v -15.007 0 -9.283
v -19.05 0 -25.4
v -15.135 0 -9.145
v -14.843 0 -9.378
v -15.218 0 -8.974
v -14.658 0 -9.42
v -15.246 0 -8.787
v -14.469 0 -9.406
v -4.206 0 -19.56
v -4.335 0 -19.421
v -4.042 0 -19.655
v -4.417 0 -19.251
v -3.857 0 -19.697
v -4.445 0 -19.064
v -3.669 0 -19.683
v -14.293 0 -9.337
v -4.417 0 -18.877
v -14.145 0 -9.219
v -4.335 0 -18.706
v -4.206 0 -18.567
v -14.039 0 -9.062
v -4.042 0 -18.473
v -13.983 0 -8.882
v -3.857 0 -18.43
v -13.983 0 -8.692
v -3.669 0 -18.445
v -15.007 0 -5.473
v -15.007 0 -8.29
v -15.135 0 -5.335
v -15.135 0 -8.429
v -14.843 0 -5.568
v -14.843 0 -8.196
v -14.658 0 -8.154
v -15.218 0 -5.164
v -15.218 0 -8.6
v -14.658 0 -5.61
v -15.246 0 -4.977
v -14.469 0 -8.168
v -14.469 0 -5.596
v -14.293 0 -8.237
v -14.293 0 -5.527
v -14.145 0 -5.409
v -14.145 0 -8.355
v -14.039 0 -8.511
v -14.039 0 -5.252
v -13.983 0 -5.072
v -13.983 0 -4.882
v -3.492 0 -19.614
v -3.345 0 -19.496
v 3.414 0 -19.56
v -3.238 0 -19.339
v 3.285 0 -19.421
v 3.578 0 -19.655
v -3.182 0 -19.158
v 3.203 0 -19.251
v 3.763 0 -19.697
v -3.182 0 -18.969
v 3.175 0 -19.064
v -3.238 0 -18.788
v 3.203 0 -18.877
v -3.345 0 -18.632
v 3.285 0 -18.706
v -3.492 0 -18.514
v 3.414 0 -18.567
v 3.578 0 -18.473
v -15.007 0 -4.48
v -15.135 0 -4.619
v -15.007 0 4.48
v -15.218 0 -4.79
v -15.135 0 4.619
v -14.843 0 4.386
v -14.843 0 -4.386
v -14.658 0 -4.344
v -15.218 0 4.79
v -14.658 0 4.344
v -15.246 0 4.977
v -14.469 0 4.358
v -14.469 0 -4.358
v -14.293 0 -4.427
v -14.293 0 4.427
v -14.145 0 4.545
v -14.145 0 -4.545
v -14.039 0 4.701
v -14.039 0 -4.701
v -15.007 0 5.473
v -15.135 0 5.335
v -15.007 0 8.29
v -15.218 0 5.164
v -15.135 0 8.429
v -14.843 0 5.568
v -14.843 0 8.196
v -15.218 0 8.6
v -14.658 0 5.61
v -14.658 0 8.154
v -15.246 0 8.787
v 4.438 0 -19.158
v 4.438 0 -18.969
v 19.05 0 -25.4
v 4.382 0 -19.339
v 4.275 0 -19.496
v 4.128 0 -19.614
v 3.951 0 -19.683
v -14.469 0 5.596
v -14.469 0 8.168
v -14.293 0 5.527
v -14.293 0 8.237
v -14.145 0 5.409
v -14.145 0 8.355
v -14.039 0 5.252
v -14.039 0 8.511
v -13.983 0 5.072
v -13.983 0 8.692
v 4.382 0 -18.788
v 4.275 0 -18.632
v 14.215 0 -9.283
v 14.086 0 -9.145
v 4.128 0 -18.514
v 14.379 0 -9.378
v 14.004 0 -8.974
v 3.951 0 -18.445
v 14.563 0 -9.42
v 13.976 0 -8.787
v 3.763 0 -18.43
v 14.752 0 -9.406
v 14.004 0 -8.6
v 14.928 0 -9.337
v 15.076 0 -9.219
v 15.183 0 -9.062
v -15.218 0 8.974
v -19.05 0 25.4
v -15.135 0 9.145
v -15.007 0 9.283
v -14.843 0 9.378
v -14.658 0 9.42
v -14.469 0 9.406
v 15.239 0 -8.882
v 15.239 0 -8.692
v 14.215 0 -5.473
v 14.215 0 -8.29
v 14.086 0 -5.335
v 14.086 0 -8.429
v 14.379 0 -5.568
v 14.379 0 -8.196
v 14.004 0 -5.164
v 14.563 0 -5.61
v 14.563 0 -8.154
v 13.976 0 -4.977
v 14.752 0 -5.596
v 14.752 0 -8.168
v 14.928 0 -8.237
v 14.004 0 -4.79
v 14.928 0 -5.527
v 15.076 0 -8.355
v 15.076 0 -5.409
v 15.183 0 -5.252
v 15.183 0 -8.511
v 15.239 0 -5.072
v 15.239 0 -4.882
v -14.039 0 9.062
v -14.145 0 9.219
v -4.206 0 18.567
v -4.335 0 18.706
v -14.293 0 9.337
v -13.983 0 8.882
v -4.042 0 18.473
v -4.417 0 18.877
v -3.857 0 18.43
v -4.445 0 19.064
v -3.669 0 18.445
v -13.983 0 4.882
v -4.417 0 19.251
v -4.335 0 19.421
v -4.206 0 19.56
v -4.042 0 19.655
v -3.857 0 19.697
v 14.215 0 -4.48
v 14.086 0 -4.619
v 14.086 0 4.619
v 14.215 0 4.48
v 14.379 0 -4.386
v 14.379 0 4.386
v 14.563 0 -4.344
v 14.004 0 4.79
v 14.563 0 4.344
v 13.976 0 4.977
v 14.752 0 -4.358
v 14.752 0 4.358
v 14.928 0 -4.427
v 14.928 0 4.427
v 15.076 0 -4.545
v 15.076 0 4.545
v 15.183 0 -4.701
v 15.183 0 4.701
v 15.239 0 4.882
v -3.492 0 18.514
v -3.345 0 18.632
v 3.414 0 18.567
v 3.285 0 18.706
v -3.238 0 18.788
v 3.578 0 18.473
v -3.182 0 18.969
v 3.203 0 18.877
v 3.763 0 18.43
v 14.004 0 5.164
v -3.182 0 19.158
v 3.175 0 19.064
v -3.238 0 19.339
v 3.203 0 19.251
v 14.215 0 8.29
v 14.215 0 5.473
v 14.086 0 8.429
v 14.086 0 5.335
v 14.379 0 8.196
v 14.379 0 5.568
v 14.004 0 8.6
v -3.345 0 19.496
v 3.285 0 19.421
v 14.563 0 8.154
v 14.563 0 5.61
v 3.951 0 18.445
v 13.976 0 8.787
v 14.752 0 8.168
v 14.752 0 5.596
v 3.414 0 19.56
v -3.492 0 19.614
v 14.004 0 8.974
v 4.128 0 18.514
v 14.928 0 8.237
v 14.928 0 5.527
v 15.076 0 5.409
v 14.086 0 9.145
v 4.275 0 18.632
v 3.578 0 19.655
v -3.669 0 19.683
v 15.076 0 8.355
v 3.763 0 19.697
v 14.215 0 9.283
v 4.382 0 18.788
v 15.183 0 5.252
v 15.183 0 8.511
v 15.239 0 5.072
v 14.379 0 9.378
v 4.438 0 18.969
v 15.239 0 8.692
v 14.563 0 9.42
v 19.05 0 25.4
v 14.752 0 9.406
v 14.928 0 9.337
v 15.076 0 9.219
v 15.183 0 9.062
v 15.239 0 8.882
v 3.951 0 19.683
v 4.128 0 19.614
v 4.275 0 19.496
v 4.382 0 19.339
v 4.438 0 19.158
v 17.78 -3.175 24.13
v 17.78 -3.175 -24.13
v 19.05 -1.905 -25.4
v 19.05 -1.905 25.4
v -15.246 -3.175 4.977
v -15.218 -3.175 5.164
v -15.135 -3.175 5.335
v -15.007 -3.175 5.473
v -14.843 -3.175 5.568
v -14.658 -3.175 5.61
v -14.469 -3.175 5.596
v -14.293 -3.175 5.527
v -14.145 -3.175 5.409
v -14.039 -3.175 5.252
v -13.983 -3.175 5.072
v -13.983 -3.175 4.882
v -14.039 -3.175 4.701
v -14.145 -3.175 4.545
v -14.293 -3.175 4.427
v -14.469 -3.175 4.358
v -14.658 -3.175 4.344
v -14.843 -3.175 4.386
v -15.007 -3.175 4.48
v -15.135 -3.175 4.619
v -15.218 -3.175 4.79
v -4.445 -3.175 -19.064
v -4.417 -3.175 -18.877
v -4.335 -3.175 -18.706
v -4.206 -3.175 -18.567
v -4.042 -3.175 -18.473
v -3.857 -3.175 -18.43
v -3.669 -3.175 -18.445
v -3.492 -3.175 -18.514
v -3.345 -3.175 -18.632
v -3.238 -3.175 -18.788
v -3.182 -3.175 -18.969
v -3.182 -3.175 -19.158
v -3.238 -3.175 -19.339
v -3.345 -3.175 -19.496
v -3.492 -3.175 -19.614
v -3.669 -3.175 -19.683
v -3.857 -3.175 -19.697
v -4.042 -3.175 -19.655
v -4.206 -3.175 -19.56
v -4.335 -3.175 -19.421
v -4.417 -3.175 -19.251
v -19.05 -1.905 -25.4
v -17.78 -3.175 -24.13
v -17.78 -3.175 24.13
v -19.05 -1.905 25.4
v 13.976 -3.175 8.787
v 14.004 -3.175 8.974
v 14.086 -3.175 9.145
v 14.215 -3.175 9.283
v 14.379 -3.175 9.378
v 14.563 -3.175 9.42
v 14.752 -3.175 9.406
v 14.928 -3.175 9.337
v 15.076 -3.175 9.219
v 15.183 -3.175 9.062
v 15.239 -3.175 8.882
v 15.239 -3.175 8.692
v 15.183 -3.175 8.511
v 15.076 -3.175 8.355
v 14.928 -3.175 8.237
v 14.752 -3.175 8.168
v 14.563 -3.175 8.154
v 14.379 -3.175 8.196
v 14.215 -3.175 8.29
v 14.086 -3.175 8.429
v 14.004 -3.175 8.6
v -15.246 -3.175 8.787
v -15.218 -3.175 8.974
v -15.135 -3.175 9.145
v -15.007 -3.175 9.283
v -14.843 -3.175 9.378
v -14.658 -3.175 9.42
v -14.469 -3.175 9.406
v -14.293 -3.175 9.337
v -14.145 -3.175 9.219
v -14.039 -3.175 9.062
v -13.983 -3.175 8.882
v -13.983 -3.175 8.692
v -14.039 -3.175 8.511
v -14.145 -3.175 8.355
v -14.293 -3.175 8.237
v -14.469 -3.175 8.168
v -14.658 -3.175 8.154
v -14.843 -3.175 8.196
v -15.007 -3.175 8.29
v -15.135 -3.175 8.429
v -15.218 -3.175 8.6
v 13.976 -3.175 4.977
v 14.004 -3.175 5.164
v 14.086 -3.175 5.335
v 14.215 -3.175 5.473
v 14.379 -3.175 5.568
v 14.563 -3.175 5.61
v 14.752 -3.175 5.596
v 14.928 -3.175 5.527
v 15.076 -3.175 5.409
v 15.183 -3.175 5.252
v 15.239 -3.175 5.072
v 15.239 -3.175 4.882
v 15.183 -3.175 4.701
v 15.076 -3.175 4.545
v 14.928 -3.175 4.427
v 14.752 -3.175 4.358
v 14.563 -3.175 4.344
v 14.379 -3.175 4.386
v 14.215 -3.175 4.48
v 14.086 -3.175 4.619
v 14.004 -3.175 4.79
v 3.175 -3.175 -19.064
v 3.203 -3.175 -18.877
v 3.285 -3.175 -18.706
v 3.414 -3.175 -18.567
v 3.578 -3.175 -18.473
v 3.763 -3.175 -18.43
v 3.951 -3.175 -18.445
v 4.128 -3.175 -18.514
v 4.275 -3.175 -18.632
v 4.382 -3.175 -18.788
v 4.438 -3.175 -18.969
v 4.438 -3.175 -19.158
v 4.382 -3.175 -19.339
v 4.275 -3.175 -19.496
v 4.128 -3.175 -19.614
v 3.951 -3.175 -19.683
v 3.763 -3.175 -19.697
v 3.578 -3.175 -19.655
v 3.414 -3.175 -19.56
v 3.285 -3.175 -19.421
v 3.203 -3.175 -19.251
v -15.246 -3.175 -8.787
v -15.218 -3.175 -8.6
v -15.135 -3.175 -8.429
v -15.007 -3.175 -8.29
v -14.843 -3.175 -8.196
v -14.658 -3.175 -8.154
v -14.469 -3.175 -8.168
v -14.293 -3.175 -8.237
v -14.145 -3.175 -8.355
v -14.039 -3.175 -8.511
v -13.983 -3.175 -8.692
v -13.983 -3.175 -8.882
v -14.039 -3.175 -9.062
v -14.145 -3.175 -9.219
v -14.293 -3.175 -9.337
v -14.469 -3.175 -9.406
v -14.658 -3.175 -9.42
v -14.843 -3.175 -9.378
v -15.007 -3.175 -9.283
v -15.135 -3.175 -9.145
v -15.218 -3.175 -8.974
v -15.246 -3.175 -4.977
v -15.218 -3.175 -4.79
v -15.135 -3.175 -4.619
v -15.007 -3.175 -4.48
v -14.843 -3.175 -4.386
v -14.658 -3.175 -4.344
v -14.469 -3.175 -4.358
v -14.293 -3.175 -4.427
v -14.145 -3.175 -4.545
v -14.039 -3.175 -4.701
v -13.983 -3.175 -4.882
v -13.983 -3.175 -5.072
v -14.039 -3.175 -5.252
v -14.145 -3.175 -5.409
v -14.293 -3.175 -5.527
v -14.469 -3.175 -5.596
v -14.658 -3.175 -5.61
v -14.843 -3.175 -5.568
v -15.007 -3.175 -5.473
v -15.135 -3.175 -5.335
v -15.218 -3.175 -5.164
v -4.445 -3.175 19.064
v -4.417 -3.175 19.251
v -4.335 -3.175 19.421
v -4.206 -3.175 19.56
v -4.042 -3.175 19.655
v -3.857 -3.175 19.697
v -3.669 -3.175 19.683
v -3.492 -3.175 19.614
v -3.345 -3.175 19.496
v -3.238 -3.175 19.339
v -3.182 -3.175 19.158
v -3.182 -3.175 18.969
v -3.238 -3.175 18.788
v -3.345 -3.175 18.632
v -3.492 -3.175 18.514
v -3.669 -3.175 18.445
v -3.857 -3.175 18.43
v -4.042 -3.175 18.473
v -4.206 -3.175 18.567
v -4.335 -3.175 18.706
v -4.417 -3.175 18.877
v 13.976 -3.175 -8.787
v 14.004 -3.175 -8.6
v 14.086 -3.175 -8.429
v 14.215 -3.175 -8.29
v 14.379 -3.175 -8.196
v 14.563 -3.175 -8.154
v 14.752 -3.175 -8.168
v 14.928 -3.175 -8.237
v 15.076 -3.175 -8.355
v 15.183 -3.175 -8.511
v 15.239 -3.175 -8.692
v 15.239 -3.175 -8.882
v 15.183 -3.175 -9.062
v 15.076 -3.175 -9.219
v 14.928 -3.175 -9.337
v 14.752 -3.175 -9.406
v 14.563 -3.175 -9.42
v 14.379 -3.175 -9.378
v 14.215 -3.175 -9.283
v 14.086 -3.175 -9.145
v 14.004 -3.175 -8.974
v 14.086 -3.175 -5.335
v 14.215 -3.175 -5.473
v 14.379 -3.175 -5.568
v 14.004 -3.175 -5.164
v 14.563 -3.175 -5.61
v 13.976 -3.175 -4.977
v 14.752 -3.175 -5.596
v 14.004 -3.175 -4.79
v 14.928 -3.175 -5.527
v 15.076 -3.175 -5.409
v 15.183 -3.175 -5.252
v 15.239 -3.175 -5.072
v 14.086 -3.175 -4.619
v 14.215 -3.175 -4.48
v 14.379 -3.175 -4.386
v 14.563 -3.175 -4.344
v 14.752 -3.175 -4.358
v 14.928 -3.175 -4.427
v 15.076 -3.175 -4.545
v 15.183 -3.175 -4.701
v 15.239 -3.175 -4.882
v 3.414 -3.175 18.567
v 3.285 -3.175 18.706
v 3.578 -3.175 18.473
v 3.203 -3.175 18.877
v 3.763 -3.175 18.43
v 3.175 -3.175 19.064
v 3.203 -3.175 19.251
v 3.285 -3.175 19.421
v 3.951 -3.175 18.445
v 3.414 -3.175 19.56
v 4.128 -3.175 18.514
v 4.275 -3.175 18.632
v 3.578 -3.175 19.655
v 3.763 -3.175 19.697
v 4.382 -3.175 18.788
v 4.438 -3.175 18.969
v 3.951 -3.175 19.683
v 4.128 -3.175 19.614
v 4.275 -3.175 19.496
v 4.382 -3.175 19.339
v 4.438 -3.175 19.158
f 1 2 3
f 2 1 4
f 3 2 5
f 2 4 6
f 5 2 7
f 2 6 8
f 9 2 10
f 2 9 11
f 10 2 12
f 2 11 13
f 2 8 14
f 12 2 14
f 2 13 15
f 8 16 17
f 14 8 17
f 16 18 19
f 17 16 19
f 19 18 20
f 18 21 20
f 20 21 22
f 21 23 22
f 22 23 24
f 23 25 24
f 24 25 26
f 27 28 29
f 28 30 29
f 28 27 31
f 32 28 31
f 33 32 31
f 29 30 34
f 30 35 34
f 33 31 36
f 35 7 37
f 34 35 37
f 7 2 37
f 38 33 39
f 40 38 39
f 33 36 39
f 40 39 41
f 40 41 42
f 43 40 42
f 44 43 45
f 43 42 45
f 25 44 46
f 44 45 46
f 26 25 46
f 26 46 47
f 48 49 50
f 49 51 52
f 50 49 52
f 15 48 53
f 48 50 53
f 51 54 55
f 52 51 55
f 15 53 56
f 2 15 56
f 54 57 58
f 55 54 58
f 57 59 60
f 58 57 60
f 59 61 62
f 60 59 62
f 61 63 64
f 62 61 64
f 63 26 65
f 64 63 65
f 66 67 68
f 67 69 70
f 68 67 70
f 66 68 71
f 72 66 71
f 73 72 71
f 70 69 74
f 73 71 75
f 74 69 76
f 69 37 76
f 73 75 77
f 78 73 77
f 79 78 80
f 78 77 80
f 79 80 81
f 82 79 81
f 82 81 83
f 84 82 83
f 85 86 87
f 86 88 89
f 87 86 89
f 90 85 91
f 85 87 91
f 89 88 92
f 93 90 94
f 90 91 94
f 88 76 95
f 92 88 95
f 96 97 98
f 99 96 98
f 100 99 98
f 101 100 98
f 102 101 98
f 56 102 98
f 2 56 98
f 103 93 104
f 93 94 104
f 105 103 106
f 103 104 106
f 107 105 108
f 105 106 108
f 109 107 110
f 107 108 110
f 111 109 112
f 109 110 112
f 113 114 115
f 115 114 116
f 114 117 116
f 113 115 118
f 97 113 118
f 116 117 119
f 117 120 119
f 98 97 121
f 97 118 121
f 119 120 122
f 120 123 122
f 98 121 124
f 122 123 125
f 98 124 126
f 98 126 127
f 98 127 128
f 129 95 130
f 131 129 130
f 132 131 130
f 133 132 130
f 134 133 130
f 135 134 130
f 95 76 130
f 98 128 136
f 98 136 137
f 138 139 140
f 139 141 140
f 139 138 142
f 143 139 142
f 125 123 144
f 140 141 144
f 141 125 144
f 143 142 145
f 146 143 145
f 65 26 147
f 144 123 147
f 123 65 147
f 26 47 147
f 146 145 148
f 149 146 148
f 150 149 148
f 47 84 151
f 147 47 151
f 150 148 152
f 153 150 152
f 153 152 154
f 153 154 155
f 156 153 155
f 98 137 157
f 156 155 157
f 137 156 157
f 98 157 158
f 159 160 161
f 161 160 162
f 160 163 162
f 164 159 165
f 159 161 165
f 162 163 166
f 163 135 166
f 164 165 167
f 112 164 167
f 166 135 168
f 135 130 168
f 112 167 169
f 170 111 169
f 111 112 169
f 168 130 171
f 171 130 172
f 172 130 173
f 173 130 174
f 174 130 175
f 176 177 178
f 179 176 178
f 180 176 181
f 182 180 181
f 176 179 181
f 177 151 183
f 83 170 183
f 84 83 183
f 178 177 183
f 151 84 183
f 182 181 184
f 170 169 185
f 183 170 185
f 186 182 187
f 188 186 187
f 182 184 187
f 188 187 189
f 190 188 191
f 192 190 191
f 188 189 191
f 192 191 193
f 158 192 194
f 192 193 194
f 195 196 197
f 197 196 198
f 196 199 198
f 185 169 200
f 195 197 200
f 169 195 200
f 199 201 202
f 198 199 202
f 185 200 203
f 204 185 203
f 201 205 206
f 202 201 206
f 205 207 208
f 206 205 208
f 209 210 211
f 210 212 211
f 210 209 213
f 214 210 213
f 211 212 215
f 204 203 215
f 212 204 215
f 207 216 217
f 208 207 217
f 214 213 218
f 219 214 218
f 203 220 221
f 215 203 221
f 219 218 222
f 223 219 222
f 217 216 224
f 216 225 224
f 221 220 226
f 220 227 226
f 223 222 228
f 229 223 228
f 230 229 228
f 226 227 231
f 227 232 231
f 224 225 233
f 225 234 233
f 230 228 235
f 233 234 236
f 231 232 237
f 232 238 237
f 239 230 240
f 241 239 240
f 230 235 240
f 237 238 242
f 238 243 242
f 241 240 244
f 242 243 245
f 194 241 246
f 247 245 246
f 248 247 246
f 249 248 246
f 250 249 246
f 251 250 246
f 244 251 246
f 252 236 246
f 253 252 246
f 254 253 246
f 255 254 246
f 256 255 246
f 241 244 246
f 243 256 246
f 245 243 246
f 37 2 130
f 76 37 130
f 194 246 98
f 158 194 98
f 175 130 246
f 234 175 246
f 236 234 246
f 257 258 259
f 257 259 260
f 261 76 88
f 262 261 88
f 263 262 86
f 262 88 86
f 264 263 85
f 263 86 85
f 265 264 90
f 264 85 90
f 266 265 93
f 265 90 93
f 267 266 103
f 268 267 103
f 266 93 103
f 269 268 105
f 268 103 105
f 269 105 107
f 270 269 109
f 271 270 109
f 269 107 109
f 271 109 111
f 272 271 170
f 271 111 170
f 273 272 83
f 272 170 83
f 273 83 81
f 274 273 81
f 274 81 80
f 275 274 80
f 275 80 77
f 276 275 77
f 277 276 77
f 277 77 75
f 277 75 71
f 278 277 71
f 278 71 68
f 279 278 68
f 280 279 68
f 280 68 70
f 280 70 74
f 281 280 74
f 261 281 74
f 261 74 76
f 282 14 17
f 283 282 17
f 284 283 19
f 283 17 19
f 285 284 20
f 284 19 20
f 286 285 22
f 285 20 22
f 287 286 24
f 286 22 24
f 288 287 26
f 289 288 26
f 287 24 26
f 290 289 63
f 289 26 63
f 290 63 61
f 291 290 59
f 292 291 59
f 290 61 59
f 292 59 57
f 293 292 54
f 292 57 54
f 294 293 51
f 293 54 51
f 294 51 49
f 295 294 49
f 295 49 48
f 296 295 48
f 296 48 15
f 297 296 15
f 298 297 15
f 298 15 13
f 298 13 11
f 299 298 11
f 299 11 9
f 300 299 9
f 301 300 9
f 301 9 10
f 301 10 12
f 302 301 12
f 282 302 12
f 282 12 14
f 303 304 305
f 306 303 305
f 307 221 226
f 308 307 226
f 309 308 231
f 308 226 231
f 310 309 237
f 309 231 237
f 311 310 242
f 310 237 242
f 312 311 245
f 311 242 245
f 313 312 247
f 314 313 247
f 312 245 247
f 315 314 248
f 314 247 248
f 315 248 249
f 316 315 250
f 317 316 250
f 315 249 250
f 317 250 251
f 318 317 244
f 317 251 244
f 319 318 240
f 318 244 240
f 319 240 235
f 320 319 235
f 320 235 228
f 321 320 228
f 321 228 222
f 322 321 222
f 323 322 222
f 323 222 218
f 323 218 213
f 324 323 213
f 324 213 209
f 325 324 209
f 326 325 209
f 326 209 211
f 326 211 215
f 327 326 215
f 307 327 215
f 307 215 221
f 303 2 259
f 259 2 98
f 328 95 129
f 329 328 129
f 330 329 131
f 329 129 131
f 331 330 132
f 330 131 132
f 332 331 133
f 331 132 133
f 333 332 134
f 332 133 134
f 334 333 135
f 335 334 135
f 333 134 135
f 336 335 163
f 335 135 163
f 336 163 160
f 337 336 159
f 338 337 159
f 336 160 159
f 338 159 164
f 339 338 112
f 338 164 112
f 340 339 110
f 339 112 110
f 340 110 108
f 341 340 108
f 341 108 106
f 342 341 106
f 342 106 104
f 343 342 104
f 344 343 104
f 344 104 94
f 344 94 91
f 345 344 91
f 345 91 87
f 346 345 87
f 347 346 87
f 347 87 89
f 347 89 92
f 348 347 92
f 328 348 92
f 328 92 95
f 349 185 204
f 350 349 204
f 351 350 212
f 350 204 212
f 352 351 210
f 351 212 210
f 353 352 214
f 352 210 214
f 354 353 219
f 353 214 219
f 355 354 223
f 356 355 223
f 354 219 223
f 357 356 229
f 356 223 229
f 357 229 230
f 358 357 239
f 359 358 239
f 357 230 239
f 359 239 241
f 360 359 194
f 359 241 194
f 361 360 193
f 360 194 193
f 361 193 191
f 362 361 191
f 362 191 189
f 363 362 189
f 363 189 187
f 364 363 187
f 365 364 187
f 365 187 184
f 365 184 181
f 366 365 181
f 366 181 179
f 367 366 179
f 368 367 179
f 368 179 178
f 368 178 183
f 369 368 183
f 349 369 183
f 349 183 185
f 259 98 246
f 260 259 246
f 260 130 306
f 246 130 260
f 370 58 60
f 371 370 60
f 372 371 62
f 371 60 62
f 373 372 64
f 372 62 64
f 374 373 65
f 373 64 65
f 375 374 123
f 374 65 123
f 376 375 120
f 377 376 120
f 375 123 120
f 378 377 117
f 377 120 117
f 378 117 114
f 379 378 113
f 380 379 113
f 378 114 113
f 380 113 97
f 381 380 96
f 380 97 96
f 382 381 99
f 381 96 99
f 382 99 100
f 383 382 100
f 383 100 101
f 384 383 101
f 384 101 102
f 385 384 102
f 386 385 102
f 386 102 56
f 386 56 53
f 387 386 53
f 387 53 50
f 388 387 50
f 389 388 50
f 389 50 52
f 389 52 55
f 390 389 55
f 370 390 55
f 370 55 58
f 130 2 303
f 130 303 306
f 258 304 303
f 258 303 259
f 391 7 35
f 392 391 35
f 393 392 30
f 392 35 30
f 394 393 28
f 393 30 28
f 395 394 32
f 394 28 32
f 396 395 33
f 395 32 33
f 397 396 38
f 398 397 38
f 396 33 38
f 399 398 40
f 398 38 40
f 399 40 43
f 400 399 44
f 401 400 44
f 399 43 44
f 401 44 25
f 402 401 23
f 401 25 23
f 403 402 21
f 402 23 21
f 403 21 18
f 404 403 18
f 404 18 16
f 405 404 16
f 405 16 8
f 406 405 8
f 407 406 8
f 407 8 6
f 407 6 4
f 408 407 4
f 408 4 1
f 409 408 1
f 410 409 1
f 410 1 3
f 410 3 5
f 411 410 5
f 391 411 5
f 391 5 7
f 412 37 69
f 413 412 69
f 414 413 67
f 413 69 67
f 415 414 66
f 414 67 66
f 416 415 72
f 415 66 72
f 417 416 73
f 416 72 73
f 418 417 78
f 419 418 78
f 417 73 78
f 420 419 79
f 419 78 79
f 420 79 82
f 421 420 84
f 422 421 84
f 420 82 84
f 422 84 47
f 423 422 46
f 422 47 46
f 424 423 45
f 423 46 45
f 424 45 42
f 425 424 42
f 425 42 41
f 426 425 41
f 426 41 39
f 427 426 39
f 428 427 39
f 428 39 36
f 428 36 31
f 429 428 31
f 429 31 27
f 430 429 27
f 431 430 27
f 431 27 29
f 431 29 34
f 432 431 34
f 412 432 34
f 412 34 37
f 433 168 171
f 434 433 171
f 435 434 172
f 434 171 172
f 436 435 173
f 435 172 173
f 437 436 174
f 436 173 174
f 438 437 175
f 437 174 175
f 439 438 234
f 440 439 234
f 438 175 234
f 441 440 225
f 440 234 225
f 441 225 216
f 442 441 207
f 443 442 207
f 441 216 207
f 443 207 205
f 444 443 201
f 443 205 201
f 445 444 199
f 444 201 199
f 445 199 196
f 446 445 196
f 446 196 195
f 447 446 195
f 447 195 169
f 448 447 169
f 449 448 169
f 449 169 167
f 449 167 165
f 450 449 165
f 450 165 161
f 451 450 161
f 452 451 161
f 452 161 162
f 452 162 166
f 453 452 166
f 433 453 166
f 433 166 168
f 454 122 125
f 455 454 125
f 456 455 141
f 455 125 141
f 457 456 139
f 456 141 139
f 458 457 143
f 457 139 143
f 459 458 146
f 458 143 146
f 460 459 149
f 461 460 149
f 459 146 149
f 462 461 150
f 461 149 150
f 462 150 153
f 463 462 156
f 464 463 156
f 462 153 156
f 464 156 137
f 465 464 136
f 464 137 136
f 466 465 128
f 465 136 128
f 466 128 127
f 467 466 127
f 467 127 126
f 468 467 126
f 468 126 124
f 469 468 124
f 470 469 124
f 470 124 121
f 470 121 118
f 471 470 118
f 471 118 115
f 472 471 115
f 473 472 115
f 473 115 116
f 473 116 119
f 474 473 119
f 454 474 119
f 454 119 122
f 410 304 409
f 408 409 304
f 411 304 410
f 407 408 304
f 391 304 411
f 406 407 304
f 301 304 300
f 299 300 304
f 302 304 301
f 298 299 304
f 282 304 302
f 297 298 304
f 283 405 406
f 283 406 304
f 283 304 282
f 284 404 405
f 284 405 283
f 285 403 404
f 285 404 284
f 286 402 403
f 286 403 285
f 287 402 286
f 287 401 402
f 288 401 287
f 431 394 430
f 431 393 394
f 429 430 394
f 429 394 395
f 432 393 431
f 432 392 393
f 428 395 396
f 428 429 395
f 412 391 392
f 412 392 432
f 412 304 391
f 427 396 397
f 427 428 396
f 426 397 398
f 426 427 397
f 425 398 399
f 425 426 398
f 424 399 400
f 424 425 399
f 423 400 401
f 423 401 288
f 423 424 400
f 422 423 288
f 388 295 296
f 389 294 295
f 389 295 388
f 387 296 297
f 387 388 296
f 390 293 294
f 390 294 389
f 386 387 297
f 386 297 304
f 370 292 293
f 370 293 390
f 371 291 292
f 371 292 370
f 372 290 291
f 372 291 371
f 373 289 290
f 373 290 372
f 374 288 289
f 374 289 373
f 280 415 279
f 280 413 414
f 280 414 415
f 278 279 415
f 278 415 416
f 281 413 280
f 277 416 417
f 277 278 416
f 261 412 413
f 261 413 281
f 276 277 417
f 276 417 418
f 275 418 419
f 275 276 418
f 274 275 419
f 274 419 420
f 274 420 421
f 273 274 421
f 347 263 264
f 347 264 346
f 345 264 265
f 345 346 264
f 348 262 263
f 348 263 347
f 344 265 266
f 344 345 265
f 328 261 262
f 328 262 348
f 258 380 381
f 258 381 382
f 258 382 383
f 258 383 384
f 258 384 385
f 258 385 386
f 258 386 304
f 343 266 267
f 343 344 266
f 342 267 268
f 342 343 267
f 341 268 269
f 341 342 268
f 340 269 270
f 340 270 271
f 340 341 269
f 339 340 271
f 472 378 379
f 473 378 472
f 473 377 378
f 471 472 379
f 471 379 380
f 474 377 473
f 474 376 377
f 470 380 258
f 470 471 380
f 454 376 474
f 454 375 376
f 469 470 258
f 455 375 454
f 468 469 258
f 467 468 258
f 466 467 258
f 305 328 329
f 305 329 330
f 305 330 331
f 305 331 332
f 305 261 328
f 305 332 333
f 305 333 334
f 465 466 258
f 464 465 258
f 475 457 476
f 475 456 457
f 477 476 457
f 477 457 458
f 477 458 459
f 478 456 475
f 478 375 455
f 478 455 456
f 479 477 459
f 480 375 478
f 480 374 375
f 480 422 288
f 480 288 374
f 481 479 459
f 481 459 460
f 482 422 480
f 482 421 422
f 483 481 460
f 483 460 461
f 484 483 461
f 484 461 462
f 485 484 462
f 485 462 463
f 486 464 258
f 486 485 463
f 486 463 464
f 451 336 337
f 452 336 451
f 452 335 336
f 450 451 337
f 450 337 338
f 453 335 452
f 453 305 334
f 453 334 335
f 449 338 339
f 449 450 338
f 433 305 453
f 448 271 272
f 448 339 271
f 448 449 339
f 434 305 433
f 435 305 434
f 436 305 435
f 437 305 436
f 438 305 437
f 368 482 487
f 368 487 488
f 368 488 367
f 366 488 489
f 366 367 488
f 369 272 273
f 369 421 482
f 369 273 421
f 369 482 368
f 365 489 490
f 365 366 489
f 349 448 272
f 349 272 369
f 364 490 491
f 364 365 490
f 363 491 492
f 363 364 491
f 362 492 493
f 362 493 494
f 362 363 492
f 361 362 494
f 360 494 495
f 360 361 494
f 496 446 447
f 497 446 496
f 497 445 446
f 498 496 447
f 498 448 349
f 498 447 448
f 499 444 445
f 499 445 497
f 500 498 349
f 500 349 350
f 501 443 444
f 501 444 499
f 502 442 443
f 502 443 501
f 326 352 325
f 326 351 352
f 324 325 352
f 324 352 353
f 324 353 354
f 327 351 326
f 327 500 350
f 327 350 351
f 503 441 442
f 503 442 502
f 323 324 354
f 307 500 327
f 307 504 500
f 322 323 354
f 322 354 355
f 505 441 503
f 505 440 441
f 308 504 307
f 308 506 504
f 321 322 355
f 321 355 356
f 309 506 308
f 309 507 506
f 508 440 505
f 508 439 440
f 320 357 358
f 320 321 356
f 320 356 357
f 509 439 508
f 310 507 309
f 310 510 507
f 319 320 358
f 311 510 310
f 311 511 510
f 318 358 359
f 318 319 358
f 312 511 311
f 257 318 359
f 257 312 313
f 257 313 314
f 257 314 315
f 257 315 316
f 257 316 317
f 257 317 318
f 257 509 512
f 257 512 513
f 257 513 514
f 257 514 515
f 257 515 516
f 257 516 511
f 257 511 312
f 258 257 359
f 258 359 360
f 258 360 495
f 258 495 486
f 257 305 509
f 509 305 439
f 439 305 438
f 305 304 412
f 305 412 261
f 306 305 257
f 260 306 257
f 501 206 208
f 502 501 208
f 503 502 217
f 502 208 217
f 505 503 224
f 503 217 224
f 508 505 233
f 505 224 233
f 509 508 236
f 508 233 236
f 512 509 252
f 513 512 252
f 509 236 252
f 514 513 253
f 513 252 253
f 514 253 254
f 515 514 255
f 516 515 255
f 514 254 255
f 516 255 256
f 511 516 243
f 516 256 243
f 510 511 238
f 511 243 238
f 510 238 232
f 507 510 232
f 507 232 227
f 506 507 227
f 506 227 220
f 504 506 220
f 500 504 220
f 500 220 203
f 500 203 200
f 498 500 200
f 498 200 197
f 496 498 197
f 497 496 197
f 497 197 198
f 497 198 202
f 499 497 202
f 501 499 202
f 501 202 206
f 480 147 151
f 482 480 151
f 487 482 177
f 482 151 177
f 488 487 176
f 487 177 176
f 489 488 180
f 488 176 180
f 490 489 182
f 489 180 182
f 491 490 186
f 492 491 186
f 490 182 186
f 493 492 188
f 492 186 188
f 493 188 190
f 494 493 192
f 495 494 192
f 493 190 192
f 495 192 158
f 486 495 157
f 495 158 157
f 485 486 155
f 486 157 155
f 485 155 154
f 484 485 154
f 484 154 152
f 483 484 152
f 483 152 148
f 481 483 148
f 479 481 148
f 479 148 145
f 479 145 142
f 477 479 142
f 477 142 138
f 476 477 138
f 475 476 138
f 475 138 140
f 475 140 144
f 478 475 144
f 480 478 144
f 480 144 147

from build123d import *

# Parameters (mm, degrees)
F0_W     = 38.1
F0_H     = 50.8
F1_DEPTH = 3.175
F2_SIZE  = 1.27
F4_D     = 1.27


with BuildPart() as f1:
    # F0 (on Front) → F1 (new body)
    with BuildSketch(Plane.XZ):
        Rectangle(F0_W, F0_H)
    extrude(amount=F1_DEPTH)

    # F2
    f2_edges = [f1.edges().sort_by_distance(p)[0] for p in [
        (19.05, -3.175, 0),
        (0, -3.175, 25.4),
        (-19.05, -3.175, 0),
        (0, -3.175, -25.4),
    ]]
    chamfer(f2_edges, length=F2_SIZE)

    # F4 (through all)
    with Locations(Plane.XZ.offset(3.175)):
        with Locations((-14.610798, 8.786894), (3.81, -19.063698), (14.610798, -4.976894), (-14.610798, 4.976894), (3.81, 19.063698), (14.610798, -8.786894), (-3.81, 19.063698), (-14.610798, -8.786894), (14.610798, 4.976894), (14.610798, 8.786894), (-14.610798, -4.976894), (-3.81, -19.063698)):
            Hole(F4_D / 2)


solid = f1.part
